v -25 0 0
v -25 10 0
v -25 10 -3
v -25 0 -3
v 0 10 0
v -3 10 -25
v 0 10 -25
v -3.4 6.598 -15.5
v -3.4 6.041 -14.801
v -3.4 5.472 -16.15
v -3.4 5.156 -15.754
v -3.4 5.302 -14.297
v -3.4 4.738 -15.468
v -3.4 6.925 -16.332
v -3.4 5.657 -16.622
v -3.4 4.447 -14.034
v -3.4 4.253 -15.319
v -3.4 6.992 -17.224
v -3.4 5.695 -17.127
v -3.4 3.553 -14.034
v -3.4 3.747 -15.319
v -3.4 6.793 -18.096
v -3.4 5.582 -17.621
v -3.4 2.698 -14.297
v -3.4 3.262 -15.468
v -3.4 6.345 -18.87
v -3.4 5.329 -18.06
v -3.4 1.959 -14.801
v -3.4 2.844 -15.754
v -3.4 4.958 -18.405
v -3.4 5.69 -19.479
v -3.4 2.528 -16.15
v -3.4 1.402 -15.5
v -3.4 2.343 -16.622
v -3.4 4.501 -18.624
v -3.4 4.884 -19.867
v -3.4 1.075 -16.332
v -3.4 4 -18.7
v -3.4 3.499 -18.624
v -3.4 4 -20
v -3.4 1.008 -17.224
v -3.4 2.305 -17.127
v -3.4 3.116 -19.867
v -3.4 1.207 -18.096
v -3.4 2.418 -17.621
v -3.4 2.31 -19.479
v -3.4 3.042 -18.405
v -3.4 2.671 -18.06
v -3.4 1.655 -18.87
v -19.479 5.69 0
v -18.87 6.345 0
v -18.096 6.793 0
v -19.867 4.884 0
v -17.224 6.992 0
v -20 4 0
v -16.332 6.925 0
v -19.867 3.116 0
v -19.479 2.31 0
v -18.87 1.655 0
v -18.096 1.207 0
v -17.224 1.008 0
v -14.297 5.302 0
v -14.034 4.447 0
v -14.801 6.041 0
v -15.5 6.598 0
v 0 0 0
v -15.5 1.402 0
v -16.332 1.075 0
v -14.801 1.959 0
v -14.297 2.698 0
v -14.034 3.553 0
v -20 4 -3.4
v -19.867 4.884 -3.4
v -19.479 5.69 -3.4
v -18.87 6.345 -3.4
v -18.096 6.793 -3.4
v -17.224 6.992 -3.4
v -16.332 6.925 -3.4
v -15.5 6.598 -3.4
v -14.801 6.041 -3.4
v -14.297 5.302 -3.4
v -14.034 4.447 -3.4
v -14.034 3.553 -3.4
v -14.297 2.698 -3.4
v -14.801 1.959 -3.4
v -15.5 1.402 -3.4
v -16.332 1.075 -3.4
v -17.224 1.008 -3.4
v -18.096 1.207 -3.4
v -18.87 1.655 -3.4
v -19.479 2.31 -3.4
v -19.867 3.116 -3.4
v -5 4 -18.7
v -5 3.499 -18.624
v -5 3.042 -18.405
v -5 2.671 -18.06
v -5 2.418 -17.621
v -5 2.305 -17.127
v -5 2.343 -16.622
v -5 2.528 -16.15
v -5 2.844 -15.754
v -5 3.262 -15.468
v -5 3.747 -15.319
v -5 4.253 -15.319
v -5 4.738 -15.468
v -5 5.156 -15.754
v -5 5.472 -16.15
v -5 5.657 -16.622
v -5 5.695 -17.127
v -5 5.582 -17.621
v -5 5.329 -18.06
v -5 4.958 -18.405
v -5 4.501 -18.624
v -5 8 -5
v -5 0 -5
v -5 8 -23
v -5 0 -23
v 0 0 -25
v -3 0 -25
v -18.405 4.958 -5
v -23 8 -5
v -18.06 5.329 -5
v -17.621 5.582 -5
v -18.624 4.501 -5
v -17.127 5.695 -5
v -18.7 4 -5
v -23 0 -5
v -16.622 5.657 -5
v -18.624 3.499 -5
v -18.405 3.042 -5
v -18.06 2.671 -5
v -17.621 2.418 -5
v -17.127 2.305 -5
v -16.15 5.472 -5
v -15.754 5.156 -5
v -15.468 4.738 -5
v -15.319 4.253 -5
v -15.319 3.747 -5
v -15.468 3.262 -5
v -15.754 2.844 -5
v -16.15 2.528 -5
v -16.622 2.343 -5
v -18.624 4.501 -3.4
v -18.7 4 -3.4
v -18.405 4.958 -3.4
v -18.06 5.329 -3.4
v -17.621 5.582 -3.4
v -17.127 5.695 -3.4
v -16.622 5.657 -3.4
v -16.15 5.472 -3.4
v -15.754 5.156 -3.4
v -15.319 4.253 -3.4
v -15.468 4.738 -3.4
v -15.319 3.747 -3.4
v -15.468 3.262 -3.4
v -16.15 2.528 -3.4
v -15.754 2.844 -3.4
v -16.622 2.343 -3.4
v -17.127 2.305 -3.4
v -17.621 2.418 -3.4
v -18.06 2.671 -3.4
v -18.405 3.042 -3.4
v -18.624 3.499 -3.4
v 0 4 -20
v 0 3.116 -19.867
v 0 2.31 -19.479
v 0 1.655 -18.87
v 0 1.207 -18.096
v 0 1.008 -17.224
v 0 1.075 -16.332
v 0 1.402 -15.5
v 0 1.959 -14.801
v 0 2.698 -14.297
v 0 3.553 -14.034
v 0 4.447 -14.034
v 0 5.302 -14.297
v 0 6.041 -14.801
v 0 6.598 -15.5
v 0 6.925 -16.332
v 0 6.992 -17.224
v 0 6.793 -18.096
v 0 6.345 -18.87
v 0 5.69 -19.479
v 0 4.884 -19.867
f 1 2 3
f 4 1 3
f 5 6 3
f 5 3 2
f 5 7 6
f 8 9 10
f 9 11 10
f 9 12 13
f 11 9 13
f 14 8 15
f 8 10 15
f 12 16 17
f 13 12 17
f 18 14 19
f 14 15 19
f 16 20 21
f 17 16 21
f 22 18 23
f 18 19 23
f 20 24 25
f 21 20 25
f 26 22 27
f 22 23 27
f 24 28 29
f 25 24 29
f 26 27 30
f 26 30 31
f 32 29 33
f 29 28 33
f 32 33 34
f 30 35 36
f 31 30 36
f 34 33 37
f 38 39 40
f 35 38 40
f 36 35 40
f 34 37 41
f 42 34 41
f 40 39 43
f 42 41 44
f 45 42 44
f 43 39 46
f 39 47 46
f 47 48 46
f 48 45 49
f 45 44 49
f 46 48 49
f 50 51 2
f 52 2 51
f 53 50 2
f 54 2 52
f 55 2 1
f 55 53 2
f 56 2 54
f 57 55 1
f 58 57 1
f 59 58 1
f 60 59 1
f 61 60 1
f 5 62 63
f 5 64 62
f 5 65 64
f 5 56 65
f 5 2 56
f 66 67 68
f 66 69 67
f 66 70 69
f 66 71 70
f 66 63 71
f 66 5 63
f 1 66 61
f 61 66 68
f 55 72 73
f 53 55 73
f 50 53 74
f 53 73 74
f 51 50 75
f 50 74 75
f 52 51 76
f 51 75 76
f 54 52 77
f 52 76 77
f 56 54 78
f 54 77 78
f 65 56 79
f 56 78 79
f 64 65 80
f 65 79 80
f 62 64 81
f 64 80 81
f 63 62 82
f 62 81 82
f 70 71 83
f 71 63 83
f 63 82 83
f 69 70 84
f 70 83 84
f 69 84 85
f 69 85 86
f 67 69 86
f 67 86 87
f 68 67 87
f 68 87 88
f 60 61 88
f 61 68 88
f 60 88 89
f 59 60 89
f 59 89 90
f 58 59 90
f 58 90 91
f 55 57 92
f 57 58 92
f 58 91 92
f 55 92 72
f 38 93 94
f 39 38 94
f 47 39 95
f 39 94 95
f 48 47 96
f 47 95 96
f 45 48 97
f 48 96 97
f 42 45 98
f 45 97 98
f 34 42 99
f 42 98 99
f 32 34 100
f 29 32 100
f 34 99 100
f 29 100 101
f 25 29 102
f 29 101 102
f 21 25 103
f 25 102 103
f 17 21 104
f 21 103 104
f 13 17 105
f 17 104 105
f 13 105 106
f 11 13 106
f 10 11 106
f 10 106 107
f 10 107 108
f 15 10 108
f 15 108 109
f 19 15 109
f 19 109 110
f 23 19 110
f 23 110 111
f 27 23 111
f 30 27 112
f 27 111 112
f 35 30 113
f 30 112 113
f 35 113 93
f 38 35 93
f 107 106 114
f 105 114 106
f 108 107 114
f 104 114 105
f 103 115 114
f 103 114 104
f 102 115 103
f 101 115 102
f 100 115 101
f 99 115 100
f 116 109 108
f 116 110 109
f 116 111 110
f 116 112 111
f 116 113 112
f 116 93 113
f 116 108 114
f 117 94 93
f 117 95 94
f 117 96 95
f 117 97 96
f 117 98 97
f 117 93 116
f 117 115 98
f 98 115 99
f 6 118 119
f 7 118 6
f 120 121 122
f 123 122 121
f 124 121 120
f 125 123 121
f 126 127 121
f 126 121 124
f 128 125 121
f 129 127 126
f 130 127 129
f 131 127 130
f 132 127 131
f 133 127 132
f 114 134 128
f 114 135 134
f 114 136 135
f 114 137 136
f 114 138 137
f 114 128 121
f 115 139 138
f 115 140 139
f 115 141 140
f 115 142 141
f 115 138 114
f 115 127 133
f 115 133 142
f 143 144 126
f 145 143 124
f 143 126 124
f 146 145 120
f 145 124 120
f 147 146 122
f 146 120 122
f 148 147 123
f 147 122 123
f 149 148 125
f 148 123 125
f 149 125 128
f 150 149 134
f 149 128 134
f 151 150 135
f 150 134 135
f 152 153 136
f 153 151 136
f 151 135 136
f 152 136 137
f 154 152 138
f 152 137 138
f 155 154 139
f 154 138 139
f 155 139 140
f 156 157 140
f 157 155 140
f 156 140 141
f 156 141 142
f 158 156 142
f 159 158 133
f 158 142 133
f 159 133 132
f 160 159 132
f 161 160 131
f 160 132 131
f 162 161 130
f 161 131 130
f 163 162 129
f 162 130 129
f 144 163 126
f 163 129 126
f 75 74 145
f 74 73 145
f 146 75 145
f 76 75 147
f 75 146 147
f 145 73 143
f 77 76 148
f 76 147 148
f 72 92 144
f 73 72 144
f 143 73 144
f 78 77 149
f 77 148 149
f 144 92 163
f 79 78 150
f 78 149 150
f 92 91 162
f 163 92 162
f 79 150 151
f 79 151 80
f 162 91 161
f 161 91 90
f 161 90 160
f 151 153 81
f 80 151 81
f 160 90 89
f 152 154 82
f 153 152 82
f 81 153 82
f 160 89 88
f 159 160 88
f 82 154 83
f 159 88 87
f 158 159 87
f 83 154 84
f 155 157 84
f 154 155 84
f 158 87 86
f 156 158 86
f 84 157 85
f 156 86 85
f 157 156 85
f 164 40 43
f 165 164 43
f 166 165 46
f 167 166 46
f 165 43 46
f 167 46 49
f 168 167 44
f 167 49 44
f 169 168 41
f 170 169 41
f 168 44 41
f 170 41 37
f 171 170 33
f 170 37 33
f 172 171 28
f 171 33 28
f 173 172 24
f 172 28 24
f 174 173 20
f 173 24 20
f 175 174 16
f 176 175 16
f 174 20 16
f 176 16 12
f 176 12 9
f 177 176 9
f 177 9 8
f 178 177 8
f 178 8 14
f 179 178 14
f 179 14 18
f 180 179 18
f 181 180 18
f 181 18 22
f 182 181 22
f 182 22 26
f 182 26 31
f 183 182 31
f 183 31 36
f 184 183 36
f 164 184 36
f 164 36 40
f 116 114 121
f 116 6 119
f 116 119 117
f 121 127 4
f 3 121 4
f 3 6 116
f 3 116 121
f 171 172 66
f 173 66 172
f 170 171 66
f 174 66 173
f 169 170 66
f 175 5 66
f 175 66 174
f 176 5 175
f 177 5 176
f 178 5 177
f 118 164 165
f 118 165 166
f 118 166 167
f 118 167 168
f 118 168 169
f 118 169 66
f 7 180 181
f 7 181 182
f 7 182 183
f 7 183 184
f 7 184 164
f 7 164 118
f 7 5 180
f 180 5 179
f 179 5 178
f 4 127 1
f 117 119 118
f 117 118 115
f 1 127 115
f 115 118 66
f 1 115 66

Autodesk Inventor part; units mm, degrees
ref_plane "YZ Plane" through (0, 0, 0) normal (1, 0, 0) x (0, 1, 0)
ref_plane "XZ Plane" through (0, 0, 0) normal (0, 1, 0) x (-1, 0, 0)
ref_plane "XY Plane" through (0, 0, 0) normal (0, 0, 1) x (1, 0, 0)
sketch "Skizze3" plane through (0, 0, 0) normal (0, 1, 0) x (-1, 0, 0)
  line L0 (5, -5) -> (5, -25)
  line L1 (5, -25) -> (0, -25)
  line L2 (0, -25) -> (0, 0)
  line L3 (0, 0) -> (5, -5)
  dimension "d7" = 5
  dimension "d11" = 25
  dimension "d12" = 20
extrude "Extrusion3" add sketch "Skizze3" along normal blind 8
sketch "Skizze4" plane through (0, 0, 0) normal (1, 0, 0) x (0, 0, -1)
  line L0 (-0.7299, 4) -> (5.994, 4) construction
  line L1 (0, 0) -> (0, 8) projected
  point P0 (17, 4)
  point P1 (0, 4)
  dimension "d10" = 17
hole "Bohrung1" at (0, 4, -17) direction (-1, 0, 0) diameter 3.4 end through all counterbore diameter 6 counterbore depth 3.4
chamfer "Fase1" distance 2 angle 45 1 edges at (-5, 4, -25)
mirror "Spiegeln1" about plane through (-5, 0, -5) normal (-0.7071, 0, 0.7071) of "Extrusion3", "Bohrung1", "Fase1"
sketch "Skizze5" plane through (0, 0, -25) normal (1, 0, 0) x (0, 0, -1)
  line L0 (-25, 8) -> (0, 8) projected
  line L1 (-25, 0) -> (-25, 8) projected
  line L2 (-25, 8) -> (0, 8)
  line L3 (0, 8) -> (0, 10)
  line L4 (0, 10) -> (-25, 10)
  line L5 (-25, 10) -> (-25, 8)
  dimension "d23" = 2
extrude "Extrusion4" add sketch "Skizze5" against normal blind 25
sketch "Skizze6" plane through (0, 10, 0) normal (0, 1, 0) x (1, 0, 0)
  line L0 (-3, 25) -> (-25, 25) projected
  line L1 (-3, 25) -> (-25, 3)
  line L2 (0, 25) -> (-25, 25) projected
  line L3 (-25, 0) -> (-25, 25) projected
  point P0 (0, 0)
extrude "Extrusion5" cut sketch "Skizze6" against normal blind 10
equation "\"d12\" = d11 - d7"
properties part number "BT406_trajan20_21" material "Kunststoff, undurchsichtig Schwarz"
